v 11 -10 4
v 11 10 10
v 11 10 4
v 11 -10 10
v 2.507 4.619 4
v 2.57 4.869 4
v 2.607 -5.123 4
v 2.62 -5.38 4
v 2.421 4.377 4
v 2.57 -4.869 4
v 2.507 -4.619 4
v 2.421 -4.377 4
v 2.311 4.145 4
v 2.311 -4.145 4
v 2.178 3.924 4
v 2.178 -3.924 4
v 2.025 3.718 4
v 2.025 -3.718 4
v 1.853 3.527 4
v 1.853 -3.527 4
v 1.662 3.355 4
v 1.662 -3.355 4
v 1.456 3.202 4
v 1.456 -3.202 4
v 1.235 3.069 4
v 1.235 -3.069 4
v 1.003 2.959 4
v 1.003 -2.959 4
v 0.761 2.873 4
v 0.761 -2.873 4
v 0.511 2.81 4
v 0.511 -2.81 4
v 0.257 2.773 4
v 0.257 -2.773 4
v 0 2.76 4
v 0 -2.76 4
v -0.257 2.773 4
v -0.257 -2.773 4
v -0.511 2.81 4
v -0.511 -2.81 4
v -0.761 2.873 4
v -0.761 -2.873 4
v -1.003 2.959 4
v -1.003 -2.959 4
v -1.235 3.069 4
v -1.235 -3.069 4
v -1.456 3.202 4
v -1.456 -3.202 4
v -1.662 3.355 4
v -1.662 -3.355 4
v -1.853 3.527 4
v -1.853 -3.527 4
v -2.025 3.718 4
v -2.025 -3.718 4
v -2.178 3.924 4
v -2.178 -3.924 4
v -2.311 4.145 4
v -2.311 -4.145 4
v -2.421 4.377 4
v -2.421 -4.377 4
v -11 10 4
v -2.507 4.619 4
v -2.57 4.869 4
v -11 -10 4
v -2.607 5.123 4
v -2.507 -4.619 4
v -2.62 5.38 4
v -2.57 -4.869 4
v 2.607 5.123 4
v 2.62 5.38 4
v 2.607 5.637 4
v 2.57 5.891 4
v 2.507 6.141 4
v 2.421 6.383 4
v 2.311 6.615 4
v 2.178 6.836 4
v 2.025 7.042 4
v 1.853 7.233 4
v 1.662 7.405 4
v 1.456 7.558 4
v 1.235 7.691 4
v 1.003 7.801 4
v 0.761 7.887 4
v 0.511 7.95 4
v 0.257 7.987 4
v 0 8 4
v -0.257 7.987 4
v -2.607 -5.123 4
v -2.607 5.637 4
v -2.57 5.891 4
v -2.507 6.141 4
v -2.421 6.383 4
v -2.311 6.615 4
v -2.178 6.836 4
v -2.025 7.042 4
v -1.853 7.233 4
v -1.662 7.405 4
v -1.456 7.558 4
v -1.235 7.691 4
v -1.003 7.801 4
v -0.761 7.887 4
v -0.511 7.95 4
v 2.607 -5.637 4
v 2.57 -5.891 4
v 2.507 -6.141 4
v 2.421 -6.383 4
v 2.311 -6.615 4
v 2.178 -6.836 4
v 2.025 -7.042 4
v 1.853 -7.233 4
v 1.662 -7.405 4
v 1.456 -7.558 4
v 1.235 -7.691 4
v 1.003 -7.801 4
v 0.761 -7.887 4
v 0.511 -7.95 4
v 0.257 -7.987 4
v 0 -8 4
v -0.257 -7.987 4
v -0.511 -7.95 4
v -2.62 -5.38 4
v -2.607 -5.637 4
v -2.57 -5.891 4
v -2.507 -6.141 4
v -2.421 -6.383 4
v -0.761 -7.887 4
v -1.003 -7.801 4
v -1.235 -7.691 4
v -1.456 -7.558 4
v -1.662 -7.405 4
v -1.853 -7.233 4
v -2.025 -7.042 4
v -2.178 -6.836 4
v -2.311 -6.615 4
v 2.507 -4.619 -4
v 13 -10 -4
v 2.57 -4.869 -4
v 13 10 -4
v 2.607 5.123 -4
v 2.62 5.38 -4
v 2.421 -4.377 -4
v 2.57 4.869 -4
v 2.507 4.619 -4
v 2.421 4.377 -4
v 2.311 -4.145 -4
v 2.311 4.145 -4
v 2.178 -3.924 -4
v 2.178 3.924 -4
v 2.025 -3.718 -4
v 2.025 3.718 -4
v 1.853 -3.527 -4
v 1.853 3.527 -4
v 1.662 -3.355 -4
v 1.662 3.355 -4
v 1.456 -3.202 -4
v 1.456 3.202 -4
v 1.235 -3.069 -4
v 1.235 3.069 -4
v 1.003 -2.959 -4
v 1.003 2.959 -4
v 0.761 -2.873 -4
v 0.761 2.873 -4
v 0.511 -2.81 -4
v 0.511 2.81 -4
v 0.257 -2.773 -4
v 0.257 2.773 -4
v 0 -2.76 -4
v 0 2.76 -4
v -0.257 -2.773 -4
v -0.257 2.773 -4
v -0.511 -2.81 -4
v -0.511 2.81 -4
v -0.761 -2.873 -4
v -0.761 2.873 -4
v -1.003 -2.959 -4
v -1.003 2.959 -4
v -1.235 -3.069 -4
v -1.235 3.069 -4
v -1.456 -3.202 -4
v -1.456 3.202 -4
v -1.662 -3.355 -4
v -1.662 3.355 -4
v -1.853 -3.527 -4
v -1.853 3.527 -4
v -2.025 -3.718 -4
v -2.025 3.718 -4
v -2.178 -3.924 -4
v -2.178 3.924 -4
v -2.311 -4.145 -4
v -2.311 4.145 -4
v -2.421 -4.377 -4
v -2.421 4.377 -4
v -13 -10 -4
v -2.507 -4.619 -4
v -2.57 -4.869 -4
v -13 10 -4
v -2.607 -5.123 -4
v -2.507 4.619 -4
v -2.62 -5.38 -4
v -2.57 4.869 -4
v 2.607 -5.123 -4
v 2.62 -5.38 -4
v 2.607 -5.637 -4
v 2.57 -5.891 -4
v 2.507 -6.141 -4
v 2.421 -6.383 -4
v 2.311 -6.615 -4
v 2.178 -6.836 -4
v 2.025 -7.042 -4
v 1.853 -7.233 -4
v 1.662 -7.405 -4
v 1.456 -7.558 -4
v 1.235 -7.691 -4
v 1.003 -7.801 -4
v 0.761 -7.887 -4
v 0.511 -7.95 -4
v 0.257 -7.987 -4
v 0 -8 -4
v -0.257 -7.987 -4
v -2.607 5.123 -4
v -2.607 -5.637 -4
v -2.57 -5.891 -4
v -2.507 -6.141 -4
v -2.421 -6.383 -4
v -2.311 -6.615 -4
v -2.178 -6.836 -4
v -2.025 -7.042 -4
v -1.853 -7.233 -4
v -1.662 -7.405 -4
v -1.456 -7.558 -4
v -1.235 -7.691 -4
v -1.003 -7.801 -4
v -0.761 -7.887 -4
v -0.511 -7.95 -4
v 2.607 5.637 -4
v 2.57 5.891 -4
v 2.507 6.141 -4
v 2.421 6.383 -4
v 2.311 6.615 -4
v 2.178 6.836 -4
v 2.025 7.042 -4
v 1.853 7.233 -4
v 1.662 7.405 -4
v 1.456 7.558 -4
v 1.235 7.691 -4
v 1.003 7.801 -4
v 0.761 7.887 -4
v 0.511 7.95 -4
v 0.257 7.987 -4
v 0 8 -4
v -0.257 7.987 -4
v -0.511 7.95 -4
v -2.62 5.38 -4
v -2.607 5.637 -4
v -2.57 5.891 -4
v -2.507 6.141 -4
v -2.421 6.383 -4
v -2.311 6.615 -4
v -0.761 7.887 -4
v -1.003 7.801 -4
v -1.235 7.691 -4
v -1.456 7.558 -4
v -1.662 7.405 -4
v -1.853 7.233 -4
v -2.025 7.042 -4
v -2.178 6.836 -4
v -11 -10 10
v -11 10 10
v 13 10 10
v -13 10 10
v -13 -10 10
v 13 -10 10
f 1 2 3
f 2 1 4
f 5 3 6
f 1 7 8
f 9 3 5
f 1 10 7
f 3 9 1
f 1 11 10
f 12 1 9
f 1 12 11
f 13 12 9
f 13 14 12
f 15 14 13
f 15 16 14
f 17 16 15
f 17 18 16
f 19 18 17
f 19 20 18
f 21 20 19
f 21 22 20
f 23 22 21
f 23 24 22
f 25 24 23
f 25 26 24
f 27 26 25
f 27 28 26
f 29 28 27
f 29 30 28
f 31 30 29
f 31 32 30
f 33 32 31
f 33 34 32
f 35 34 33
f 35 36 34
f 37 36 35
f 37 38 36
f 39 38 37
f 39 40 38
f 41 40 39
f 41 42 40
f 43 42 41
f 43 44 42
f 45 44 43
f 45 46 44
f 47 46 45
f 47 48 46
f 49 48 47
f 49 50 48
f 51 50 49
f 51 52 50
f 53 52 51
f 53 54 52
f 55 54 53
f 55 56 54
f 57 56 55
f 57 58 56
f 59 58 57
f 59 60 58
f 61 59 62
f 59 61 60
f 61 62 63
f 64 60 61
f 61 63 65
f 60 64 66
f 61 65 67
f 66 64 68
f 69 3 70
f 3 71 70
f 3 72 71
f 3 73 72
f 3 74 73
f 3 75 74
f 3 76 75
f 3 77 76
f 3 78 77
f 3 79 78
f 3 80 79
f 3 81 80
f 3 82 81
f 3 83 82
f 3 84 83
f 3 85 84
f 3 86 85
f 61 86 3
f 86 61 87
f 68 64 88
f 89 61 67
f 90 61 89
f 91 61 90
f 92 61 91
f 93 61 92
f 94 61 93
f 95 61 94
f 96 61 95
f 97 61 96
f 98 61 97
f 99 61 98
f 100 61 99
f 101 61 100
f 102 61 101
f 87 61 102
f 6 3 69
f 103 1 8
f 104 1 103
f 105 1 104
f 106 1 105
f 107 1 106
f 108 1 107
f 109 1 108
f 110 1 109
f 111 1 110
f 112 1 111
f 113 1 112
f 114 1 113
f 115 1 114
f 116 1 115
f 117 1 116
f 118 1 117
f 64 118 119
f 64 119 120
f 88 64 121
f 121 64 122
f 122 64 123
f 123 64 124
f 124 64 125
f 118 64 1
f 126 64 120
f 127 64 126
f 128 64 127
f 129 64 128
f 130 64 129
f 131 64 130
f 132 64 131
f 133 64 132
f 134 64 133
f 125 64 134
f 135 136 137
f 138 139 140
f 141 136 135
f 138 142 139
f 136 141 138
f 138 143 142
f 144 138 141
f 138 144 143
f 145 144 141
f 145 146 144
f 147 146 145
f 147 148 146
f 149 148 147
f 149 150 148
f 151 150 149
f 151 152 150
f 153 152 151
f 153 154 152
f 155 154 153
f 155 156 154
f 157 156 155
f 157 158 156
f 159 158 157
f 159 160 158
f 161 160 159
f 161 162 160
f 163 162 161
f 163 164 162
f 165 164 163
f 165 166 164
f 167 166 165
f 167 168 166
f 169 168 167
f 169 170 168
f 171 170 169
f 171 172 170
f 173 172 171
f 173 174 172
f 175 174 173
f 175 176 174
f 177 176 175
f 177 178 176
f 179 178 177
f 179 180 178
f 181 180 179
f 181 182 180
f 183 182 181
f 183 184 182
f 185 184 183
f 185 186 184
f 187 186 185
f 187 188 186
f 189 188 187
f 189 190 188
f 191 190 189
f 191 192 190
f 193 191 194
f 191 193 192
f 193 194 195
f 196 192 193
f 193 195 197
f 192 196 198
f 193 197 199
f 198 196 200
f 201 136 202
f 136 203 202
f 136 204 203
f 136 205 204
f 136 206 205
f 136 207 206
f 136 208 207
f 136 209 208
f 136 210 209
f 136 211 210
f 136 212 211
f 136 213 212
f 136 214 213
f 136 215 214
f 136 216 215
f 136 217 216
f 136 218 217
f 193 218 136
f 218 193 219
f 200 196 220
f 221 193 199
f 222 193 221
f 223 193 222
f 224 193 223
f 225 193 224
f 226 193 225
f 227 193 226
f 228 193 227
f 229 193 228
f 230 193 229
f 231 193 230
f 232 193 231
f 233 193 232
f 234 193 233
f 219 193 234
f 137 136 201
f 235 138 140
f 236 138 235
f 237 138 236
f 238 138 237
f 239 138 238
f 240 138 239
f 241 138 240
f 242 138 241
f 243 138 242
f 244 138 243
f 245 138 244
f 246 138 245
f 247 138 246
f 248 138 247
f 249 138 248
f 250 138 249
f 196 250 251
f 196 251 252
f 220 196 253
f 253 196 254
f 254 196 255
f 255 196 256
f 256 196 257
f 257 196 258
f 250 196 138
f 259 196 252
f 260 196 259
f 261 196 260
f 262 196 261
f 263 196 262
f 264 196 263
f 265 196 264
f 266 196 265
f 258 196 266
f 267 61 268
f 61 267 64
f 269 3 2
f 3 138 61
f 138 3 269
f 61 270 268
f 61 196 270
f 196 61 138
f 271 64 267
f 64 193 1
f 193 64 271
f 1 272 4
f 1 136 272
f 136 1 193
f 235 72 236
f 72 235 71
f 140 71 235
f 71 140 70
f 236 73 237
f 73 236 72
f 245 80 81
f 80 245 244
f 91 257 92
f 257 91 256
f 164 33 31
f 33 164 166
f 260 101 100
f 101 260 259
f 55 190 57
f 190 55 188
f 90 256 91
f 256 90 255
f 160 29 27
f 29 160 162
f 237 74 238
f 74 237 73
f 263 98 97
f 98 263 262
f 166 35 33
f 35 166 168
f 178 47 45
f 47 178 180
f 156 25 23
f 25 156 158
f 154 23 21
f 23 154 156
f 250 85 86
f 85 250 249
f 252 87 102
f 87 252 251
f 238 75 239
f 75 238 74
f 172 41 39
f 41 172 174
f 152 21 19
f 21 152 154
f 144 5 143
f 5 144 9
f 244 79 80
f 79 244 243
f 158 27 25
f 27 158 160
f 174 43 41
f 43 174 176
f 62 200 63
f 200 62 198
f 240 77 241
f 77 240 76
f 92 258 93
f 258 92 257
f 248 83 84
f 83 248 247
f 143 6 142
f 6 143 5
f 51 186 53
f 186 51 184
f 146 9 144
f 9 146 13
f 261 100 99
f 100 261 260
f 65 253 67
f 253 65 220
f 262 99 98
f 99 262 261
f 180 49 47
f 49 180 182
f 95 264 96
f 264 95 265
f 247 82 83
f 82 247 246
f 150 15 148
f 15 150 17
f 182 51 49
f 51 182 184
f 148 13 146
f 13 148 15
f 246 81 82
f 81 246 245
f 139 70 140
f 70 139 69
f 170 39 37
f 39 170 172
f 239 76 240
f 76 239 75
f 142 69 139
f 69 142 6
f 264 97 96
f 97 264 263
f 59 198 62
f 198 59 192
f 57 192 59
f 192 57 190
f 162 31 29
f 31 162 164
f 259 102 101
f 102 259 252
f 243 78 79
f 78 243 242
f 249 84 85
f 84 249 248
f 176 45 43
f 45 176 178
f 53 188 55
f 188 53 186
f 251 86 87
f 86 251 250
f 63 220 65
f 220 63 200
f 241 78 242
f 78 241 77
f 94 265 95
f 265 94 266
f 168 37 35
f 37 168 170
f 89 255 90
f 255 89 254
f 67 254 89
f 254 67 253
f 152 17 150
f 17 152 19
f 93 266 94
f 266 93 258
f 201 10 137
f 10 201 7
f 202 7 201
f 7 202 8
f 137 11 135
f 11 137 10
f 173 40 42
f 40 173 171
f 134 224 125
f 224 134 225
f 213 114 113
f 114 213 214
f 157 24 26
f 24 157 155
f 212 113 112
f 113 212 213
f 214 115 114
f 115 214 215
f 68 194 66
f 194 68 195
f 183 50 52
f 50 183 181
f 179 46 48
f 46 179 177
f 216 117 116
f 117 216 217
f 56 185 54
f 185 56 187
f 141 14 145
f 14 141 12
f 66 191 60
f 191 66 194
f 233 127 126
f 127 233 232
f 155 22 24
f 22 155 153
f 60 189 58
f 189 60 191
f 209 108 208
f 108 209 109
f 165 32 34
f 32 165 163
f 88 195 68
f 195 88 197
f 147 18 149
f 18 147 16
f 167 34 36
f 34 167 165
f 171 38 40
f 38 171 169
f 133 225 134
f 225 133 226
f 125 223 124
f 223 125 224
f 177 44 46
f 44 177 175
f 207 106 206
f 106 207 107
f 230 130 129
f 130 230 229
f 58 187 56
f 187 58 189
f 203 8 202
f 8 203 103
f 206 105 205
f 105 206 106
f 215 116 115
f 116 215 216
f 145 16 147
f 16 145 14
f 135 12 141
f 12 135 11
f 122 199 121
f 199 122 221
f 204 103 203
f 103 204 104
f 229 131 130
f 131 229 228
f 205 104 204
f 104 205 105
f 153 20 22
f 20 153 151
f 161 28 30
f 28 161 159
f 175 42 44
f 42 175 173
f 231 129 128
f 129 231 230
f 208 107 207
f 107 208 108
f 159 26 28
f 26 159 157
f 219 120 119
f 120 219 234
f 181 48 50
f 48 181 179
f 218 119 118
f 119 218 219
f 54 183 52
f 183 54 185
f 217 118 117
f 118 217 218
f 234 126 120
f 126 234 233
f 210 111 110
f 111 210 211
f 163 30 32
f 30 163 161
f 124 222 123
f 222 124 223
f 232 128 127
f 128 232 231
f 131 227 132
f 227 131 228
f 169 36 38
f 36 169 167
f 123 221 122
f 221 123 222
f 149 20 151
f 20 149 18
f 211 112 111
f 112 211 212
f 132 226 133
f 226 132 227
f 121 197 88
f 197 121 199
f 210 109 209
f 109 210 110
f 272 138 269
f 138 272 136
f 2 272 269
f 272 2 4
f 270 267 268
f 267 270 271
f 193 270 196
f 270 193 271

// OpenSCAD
railX=22.0;
railY=20;
railZ=8;

frameThickness=2;
frameHeight=6;



guardholeD=5.24;
holeD=5.24;

holeDistance=16-guardholeD/2-holeD/2;
echo(holeDistance);

guardholeX=0;
guardholeY=-holeDistance/2;

holeX=0;
holeY=holeDistance/2;

module Reverbuilt()
{
difference() {
    cube([railX,railY,railZ],center=true);
    translate([holeX,holeY,0])cylinder(d=holeD,h=railZ+0.01,$fn=64,center=true);
    translate([guardholeX,guardholeY,0])cylinder(d=guardholeD,h=railZ+0.01,$fn=64,center=true);
}

//Frame
translate([railX/2+frameThickness/2,0,frameHeight/2])cube([frameThickness,railY,railZ+frameHeight],center=true);
translate([-railX/2-frameThickness/2,0,frameHeight/2])cube([frameThickness,railY,railZ+frameHeight],center=true);

}

Reverbuilt();
